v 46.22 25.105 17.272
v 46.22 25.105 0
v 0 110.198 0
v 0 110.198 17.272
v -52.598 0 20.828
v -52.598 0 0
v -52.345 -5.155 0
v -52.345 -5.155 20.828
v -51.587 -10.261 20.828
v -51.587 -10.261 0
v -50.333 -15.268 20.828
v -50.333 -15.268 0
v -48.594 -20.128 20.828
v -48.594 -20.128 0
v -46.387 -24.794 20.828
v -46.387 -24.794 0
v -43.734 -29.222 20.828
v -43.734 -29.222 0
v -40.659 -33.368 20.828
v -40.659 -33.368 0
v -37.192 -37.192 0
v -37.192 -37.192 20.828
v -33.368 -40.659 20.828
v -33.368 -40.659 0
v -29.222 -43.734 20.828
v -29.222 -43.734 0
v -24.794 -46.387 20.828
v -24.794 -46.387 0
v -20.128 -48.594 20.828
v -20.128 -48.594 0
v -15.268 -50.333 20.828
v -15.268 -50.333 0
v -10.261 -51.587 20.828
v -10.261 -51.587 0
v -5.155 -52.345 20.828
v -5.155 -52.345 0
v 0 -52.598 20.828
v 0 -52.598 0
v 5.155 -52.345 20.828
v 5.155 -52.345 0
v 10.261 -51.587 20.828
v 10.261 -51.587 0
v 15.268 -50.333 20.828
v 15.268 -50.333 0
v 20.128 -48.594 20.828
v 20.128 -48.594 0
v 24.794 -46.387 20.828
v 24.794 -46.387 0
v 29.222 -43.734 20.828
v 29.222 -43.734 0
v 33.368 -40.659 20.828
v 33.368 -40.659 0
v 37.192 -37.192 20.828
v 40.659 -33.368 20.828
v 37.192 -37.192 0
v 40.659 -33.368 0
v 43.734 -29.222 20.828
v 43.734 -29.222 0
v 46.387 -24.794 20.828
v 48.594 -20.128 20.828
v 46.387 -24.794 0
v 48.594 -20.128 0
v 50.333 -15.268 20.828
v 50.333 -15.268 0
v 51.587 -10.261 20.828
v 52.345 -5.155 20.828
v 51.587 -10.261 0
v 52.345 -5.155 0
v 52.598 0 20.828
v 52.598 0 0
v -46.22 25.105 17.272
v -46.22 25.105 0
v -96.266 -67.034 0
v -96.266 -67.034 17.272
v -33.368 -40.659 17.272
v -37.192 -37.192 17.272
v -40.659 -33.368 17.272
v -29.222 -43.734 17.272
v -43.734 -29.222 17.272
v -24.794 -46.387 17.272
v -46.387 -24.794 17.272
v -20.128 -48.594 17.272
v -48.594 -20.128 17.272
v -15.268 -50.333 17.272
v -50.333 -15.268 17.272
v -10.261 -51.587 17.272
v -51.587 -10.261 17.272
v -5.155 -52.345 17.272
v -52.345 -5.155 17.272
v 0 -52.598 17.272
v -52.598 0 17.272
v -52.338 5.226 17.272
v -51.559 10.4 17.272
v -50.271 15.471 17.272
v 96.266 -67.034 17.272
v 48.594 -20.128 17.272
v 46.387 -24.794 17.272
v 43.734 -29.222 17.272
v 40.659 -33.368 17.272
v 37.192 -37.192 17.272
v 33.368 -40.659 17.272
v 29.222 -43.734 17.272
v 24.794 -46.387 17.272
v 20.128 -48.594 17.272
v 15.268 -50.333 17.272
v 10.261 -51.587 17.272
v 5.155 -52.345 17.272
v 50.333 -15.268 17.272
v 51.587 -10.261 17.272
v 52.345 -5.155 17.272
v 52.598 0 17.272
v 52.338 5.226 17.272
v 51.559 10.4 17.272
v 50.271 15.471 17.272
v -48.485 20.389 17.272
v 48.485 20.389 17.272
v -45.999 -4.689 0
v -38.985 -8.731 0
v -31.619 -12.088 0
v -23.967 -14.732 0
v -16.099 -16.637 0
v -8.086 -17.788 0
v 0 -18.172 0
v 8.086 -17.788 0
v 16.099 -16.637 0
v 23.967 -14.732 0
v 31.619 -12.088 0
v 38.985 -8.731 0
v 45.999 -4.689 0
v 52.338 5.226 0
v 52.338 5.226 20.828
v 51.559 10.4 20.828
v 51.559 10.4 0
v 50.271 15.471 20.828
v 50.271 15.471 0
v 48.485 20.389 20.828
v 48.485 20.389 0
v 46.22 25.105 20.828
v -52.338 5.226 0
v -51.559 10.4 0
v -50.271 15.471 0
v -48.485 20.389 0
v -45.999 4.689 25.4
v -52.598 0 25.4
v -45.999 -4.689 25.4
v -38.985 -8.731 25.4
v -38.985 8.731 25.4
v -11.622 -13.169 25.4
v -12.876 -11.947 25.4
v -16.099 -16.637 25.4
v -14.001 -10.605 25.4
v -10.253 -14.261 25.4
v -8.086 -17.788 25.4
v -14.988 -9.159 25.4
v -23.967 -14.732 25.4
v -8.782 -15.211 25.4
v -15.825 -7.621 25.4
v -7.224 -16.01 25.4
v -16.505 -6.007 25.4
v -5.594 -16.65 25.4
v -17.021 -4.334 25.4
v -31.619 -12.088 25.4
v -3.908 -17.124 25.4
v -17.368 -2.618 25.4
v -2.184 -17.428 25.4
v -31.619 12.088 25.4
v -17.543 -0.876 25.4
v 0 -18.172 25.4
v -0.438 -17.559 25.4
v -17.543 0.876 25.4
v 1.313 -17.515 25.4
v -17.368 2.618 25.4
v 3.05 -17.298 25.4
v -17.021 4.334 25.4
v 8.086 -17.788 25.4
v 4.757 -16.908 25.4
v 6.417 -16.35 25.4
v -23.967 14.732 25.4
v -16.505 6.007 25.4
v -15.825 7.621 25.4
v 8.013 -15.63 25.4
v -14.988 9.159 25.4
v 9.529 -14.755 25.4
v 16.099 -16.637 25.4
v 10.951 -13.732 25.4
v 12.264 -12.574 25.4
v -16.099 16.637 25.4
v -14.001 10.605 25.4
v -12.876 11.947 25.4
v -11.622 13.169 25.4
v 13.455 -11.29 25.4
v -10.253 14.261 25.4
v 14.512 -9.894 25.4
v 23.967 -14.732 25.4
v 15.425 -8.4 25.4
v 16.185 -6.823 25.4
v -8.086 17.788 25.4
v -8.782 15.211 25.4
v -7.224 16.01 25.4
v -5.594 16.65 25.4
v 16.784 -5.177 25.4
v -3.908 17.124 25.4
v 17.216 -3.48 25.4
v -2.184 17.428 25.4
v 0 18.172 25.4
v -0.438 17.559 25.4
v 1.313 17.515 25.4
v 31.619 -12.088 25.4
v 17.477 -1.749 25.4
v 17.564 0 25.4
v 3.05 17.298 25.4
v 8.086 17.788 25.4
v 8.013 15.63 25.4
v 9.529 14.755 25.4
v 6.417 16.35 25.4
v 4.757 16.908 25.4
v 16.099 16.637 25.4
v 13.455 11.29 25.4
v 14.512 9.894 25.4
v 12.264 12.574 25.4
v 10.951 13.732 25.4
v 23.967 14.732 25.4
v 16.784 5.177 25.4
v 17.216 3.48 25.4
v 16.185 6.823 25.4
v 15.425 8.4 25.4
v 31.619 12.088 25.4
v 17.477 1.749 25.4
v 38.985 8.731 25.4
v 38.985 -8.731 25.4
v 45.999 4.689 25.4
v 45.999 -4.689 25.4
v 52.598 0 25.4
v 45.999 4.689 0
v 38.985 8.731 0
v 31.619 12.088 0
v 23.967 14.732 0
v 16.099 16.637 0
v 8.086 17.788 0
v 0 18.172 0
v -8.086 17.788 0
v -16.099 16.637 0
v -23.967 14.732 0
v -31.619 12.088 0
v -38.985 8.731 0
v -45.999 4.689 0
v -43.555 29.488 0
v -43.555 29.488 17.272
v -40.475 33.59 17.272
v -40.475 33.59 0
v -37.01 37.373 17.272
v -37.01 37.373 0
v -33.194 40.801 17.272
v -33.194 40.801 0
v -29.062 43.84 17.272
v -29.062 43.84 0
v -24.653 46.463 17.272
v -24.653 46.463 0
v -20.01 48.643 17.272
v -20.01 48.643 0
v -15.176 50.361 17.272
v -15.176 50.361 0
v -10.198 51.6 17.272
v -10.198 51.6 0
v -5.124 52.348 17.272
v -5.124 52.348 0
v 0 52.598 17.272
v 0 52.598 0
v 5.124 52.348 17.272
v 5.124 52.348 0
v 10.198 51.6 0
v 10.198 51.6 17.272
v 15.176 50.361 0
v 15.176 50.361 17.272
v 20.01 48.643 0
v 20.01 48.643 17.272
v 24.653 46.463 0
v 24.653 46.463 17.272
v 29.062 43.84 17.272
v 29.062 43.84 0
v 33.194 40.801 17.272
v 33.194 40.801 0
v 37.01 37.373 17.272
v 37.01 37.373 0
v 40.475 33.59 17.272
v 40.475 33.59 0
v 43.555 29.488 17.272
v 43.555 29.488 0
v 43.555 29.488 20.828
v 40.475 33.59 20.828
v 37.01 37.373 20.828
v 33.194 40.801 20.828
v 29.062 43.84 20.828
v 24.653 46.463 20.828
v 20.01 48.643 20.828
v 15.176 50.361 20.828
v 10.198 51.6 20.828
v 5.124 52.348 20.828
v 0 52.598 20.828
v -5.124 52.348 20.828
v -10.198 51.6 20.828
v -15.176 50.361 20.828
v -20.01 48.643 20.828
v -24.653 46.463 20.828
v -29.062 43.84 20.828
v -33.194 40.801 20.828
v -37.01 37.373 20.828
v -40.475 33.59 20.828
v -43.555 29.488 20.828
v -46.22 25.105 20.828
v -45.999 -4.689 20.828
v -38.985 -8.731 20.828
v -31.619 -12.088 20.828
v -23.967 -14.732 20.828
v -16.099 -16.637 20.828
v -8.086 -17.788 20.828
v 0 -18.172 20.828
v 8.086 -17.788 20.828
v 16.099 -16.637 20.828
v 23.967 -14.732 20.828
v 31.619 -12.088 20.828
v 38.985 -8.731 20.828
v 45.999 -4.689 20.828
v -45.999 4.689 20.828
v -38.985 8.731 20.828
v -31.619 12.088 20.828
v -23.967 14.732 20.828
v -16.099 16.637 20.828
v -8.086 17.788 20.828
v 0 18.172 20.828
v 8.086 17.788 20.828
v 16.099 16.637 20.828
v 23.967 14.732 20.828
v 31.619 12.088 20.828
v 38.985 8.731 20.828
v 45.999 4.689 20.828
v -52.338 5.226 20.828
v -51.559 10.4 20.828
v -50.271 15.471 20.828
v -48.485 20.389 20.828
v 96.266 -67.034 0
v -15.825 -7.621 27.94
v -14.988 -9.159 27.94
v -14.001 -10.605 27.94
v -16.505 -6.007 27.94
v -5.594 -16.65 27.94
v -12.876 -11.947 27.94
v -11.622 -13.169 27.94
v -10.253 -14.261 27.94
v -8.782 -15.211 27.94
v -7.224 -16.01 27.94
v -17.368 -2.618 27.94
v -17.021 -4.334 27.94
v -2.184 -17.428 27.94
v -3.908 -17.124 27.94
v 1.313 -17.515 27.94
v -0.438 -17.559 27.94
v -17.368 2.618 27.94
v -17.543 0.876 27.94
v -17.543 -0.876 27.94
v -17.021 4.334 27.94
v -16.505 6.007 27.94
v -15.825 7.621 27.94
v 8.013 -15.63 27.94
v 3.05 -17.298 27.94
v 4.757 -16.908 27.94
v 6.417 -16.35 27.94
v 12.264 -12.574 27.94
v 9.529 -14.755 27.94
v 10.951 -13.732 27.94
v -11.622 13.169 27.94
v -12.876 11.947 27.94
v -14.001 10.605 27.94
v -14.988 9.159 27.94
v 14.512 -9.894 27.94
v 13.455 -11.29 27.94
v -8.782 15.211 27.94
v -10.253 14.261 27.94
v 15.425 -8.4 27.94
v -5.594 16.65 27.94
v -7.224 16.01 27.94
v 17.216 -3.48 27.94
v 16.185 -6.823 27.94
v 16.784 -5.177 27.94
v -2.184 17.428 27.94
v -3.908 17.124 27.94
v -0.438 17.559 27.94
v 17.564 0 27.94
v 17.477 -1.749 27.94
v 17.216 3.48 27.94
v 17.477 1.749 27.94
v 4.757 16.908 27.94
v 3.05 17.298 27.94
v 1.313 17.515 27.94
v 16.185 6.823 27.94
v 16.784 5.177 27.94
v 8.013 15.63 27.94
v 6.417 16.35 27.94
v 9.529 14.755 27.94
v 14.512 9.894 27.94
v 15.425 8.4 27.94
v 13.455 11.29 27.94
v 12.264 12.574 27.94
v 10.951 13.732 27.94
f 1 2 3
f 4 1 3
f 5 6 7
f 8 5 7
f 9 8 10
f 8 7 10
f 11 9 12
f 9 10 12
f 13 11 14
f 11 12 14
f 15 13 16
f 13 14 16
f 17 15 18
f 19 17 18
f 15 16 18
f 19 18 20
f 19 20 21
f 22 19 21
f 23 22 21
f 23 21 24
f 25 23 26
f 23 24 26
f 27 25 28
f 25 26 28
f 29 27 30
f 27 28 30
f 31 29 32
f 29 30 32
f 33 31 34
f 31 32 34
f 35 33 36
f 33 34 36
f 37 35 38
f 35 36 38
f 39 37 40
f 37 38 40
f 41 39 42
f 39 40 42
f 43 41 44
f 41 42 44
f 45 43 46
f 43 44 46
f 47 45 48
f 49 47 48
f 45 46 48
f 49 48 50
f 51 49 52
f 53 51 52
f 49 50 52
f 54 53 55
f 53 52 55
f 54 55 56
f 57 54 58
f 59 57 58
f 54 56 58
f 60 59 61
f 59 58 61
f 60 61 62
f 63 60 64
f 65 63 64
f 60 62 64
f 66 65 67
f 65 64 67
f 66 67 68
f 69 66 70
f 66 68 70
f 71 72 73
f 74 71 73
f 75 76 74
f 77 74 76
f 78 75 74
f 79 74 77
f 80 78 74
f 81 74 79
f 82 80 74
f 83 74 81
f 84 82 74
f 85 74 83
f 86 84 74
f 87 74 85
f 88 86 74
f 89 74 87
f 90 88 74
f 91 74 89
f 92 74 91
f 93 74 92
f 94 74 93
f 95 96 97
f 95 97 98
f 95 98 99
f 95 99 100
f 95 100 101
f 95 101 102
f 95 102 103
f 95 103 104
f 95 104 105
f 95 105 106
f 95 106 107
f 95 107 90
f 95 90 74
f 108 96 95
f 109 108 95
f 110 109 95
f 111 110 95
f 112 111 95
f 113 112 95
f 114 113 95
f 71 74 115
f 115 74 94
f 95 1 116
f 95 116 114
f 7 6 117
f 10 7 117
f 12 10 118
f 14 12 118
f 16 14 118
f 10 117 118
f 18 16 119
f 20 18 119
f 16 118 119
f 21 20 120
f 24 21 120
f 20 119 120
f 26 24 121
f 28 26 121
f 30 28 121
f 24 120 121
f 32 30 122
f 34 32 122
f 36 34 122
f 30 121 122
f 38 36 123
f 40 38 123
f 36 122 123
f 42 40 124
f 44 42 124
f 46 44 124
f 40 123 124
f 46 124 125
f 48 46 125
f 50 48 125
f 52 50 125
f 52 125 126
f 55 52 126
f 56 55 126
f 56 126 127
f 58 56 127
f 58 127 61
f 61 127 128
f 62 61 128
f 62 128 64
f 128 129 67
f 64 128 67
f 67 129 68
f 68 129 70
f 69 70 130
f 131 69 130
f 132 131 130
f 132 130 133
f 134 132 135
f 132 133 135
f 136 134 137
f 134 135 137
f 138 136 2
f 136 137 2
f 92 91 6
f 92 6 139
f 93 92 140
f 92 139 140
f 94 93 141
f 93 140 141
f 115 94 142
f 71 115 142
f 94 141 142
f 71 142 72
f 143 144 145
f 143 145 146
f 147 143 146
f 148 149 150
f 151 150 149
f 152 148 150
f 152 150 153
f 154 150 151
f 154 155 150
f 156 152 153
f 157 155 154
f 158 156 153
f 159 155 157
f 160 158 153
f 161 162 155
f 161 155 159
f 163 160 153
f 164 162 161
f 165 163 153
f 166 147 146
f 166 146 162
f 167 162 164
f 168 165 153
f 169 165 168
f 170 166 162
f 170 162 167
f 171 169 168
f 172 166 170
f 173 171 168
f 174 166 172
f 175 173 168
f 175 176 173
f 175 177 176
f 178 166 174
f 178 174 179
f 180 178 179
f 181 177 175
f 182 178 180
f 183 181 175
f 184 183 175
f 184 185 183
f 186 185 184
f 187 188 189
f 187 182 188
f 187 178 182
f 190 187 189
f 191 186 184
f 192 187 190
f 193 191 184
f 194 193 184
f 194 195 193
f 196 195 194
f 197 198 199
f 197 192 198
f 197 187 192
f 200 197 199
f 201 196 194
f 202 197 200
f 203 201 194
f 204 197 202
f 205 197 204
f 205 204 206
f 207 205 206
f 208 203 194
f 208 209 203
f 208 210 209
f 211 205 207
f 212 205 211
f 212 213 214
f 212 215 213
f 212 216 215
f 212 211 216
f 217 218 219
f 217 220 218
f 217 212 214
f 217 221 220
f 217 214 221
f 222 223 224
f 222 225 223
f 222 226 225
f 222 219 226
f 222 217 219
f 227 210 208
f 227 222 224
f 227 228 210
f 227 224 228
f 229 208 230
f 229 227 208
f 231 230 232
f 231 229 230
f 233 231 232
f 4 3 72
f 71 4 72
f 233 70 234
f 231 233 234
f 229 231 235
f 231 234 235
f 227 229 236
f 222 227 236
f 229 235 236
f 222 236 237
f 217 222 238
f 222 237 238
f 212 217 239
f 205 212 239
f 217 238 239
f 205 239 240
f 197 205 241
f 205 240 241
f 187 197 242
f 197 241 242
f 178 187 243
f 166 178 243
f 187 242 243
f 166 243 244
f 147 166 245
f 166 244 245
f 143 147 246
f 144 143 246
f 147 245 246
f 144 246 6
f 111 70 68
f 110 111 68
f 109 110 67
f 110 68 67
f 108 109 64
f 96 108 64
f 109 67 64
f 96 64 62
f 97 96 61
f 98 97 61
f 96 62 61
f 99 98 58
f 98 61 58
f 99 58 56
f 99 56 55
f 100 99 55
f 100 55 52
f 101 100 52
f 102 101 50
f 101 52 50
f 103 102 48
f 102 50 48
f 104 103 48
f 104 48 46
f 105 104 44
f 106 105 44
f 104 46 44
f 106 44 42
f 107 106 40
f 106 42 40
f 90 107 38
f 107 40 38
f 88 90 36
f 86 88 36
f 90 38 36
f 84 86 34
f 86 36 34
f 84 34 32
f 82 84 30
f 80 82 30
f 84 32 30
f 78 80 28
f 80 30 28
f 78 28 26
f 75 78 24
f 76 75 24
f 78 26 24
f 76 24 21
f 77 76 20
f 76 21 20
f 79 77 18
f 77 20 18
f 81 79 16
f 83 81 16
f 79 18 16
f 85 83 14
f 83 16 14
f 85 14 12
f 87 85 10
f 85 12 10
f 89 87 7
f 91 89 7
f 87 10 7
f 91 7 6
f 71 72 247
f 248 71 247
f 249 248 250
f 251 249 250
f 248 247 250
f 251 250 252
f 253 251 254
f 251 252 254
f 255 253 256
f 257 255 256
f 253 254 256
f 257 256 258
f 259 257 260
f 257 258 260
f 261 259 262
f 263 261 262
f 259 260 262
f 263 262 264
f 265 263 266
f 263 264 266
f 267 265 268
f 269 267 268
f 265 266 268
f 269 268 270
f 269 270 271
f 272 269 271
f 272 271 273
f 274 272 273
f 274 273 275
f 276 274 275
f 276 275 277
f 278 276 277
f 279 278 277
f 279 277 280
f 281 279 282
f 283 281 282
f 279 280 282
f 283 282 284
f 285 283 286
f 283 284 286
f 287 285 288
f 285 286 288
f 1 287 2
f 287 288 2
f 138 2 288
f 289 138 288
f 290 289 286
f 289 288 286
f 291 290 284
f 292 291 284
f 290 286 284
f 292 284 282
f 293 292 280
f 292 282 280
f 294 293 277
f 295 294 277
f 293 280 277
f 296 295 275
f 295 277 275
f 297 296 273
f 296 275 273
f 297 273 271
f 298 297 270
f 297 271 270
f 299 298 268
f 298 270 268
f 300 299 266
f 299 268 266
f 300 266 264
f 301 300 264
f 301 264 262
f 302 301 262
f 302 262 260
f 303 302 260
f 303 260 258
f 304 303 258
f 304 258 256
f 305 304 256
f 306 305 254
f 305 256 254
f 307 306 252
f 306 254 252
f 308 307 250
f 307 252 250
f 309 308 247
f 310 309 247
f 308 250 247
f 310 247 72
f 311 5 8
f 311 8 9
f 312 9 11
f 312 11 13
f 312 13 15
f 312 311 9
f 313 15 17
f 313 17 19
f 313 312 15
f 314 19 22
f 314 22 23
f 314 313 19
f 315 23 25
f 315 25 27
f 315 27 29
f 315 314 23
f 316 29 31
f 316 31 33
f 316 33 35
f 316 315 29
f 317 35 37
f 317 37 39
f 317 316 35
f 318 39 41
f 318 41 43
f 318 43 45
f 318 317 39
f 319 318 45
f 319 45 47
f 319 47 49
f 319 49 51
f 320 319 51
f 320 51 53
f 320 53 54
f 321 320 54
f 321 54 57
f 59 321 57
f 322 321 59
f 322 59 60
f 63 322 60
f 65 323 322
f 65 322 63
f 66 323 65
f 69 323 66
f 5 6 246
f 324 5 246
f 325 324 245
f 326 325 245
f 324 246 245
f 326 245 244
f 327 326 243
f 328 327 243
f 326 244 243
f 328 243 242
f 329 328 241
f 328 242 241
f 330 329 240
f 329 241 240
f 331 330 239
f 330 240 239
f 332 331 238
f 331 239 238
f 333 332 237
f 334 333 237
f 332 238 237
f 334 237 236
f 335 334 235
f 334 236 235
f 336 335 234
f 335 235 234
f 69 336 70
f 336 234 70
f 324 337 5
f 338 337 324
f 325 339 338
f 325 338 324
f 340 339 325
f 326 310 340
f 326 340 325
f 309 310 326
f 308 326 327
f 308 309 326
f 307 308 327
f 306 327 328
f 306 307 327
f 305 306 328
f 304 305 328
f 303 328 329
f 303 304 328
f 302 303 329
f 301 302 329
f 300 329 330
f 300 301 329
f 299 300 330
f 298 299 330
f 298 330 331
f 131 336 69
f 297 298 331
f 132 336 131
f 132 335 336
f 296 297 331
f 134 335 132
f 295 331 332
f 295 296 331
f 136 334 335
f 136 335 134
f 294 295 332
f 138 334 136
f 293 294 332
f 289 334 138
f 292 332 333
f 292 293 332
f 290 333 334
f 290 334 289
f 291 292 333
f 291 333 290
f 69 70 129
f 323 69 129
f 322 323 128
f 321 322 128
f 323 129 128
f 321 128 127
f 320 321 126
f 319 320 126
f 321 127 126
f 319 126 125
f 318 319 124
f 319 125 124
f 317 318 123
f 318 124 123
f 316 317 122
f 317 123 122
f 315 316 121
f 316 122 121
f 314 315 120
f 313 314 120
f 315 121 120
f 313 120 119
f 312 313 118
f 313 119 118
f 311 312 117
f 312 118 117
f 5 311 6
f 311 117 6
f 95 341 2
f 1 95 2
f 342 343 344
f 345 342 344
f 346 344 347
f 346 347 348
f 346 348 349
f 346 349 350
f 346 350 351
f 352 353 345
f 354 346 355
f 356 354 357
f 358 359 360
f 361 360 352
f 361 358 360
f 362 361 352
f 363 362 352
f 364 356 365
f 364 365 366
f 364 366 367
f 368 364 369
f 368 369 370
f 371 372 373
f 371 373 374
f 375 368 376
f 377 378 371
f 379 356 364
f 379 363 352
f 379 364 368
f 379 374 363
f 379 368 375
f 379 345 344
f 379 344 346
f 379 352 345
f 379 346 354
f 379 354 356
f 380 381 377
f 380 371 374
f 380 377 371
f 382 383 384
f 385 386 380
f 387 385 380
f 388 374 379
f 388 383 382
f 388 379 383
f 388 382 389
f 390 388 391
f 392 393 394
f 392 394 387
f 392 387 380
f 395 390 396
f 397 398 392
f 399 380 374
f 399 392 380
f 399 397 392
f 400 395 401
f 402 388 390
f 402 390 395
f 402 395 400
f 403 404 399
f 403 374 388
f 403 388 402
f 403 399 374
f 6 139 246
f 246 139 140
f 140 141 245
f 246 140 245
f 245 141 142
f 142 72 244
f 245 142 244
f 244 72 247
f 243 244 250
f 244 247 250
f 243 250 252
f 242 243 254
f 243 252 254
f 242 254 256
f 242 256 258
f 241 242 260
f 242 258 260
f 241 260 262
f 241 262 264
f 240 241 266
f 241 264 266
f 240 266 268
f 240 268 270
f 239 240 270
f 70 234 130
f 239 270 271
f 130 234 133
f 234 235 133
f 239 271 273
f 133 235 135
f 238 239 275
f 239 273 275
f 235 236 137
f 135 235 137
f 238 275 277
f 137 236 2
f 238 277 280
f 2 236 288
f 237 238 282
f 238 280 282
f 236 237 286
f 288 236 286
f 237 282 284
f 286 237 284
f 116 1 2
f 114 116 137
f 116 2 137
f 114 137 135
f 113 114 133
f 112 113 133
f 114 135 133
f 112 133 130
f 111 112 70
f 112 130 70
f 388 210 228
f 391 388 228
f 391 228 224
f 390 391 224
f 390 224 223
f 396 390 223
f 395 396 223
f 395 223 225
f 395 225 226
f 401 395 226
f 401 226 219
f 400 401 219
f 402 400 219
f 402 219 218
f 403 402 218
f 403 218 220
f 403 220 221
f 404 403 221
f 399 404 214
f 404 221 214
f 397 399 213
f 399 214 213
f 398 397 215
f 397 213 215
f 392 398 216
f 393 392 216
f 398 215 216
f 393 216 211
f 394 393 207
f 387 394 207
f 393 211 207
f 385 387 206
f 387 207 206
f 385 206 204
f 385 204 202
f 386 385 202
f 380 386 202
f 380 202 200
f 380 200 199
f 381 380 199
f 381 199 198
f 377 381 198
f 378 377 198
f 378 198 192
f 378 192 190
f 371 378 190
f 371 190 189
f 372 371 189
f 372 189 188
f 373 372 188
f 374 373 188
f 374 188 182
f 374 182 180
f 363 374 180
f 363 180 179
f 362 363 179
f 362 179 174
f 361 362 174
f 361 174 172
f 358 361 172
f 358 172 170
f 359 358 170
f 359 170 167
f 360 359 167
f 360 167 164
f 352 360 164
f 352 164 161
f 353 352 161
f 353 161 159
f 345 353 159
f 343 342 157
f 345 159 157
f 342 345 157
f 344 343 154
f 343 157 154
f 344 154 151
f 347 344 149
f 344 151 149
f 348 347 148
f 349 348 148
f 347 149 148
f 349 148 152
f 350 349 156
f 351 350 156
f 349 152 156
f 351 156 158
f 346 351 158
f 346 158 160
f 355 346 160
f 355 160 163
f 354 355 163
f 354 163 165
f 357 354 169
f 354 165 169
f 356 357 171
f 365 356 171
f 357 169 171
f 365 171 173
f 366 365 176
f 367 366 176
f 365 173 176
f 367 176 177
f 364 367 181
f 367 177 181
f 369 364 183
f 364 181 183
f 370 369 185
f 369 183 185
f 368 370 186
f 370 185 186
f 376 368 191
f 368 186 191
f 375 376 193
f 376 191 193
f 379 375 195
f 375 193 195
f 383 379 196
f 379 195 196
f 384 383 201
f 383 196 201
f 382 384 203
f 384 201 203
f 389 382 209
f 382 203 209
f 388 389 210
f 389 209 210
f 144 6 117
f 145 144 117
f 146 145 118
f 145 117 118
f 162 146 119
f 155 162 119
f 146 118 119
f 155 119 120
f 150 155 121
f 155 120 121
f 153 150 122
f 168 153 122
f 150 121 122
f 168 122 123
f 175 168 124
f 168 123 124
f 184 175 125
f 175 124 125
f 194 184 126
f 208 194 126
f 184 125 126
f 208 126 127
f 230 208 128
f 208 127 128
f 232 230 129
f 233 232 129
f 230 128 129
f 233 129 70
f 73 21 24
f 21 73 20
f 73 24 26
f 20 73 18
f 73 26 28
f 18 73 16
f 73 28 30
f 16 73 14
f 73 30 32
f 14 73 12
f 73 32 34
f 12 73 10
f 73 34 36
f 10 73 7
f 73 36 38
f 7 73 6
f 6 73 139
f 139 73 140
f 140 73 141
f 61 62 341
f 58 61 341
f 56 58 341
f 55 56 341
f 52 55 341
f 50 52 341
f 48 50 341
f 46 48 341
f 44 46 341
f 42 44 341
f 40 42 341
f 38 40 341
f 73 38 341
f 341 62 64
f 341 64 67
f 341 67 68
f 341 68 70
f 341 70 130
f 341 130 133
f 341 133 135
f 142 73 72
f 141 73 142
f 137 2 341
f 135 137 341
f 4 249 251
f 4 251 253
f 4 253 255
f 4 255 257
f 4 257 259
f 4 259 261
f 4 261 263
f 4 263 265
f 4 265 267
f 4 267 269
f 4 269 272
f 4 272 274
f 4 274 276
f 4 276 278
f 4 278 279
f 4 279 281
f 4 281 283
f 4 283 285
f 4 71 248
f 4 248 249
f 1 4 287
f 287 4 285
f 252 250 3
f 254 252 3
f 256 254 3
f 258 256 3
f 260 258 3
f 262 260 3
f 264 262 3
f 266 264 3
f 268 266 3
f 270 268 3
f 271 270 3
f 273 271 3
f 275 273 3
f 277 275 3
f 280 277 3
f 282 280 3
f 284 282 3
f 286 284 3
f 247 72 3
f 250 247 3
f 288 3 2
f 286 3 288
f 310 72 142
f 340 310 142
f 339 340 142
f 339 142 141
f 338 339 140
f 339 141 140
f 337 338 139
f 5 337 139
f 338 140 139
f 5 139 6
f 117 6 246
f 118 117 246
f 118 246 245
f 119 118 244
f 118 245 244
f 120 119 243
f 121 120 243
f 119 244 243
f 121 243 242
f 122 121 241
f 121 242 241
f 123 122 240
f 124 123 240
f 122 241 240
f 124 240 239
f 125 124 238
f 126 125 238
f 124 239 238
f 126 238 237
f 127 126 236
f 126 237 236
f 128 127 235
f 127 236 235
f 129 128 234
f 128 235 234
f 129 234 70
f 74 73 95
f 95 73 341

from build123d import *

# Parameters (mm, degrees)
F1_DEPTH = 17.272
F2_DEPTH = 20.828
F0_R     = 17.5643557077
F3_DEPTH = 25.4
F4_DEPTH = 27.94


with BuildPart() as f1:
    # F0 (on Top) → F1 (new body)
    with BuildSketch(Plane.XY):
        with BuildLine():
            ThreePointArc((52.5978398895, 0), (0, -52.5978398895), (-52.5978398895, 0))
            ThreePointArc((-52.5978398895, 0), (-50.9784025401, 12.9512638571), (-46.2198123565, 25.1050135784))
            Line((-46.2198123565, 25.1050135784), (-96.2664738897, -67.0338438372))
            Line((-96.2664738897, -67.0338438372), (0, -67.0338438372))
            Line((0, -67.0338438372), (96.2664738897, -67.0338438372))
            Line((96.2664738897, -67.0338438372), (46.2198122612, 25.1050137538))
            ThreePointArc((46.2198122612, 25.1050137538), (50.9784025155, 12.9512639538), (52.5978398895, 0))
        make_face()
    extrude(amount=F1_DEPTH)


with BuildPart() as f1b:
    # F0 (on Top) → F1, piece 2 (new body)
    with BuildSketch(Plane.XY):
        with BuildLine():
            Line((0, 110.1984158158), (-46.2198123565, 25.1050135784))
            ThreePointArc((-46.2198123565, 25.1050135784), (-9.98e-08, 52.5978398895), (46.2198122612, 25.1050137538))
            Line((46.2198122612, 25.1050137538), (0, 110.1984158158))
        make_face()
    extrude(amount=F1_DEPTH)


with BuildPart() as f2:
    # F0 (on Top) → F2 (new body)
    with BuildSketch(Plane.XY):
        with BuildLine():
            ThreePointArc((-46.2198123565, 25.1050135784), (-50.9784025401, 12.9512638571), (-52.5978398895, 0))
            ThreePointArc((-52.5978398895, 0), (0, 18.1721945675), (52.5978398895, 0))
            ThreePointArc((52.5978398895, 0), (50.9784025155, 12.9512639538), (46.2198122612, 25.1050137538))
            ThreePointArc((46.2198122612, 25.1050137538), (-9.98e-08, 52.5978398895), (-46.2198123565, 25.1050135784))
        make_face()
    extrude(amount=F2_DEPTH)


with BuildPart() as f2b:
    # F0 (on Top) → F2, piece 2 (new body)
    with BuildSketch(Plane.XY):
        with BuildLine():
            ThreePointArc((52.5978398895, 0), (0, -18.1721945675), (-52.5978398895, 0))
            ThreePointArc((-52.5978398895, 0), (0, -52.5978398895), (52.5978398895, 0))
        make_face()
    extrude(amount=F2_DEPTH)


with BuildPart() as f3:
    # F0 (on Top) → F3 (new body)
    with BuildSketch(Plane.XY):
        with BuildLine():
            ThreePointArc((52.5978398895, 0), (0, 18.1721945675), (-52.5978398895, 0))
            ThreePointArc((-52.5978398895, 0), (0, -18.1721945675), (52.5978398895, 0))
        make_face()
        Circle(F0_R, mode=Mode.SUBTRACT)
    extrude(amount=F3_DEPTH)

    # F0 (on Top) → F4 (join)
    with BuildSketch(Plane.XY):
        Circle(F0_R)
    extrude(amount=F4_DEPTH)


solid = Compound([f1.part, f1b.part, f2.part, f2b.part, f3.part])
